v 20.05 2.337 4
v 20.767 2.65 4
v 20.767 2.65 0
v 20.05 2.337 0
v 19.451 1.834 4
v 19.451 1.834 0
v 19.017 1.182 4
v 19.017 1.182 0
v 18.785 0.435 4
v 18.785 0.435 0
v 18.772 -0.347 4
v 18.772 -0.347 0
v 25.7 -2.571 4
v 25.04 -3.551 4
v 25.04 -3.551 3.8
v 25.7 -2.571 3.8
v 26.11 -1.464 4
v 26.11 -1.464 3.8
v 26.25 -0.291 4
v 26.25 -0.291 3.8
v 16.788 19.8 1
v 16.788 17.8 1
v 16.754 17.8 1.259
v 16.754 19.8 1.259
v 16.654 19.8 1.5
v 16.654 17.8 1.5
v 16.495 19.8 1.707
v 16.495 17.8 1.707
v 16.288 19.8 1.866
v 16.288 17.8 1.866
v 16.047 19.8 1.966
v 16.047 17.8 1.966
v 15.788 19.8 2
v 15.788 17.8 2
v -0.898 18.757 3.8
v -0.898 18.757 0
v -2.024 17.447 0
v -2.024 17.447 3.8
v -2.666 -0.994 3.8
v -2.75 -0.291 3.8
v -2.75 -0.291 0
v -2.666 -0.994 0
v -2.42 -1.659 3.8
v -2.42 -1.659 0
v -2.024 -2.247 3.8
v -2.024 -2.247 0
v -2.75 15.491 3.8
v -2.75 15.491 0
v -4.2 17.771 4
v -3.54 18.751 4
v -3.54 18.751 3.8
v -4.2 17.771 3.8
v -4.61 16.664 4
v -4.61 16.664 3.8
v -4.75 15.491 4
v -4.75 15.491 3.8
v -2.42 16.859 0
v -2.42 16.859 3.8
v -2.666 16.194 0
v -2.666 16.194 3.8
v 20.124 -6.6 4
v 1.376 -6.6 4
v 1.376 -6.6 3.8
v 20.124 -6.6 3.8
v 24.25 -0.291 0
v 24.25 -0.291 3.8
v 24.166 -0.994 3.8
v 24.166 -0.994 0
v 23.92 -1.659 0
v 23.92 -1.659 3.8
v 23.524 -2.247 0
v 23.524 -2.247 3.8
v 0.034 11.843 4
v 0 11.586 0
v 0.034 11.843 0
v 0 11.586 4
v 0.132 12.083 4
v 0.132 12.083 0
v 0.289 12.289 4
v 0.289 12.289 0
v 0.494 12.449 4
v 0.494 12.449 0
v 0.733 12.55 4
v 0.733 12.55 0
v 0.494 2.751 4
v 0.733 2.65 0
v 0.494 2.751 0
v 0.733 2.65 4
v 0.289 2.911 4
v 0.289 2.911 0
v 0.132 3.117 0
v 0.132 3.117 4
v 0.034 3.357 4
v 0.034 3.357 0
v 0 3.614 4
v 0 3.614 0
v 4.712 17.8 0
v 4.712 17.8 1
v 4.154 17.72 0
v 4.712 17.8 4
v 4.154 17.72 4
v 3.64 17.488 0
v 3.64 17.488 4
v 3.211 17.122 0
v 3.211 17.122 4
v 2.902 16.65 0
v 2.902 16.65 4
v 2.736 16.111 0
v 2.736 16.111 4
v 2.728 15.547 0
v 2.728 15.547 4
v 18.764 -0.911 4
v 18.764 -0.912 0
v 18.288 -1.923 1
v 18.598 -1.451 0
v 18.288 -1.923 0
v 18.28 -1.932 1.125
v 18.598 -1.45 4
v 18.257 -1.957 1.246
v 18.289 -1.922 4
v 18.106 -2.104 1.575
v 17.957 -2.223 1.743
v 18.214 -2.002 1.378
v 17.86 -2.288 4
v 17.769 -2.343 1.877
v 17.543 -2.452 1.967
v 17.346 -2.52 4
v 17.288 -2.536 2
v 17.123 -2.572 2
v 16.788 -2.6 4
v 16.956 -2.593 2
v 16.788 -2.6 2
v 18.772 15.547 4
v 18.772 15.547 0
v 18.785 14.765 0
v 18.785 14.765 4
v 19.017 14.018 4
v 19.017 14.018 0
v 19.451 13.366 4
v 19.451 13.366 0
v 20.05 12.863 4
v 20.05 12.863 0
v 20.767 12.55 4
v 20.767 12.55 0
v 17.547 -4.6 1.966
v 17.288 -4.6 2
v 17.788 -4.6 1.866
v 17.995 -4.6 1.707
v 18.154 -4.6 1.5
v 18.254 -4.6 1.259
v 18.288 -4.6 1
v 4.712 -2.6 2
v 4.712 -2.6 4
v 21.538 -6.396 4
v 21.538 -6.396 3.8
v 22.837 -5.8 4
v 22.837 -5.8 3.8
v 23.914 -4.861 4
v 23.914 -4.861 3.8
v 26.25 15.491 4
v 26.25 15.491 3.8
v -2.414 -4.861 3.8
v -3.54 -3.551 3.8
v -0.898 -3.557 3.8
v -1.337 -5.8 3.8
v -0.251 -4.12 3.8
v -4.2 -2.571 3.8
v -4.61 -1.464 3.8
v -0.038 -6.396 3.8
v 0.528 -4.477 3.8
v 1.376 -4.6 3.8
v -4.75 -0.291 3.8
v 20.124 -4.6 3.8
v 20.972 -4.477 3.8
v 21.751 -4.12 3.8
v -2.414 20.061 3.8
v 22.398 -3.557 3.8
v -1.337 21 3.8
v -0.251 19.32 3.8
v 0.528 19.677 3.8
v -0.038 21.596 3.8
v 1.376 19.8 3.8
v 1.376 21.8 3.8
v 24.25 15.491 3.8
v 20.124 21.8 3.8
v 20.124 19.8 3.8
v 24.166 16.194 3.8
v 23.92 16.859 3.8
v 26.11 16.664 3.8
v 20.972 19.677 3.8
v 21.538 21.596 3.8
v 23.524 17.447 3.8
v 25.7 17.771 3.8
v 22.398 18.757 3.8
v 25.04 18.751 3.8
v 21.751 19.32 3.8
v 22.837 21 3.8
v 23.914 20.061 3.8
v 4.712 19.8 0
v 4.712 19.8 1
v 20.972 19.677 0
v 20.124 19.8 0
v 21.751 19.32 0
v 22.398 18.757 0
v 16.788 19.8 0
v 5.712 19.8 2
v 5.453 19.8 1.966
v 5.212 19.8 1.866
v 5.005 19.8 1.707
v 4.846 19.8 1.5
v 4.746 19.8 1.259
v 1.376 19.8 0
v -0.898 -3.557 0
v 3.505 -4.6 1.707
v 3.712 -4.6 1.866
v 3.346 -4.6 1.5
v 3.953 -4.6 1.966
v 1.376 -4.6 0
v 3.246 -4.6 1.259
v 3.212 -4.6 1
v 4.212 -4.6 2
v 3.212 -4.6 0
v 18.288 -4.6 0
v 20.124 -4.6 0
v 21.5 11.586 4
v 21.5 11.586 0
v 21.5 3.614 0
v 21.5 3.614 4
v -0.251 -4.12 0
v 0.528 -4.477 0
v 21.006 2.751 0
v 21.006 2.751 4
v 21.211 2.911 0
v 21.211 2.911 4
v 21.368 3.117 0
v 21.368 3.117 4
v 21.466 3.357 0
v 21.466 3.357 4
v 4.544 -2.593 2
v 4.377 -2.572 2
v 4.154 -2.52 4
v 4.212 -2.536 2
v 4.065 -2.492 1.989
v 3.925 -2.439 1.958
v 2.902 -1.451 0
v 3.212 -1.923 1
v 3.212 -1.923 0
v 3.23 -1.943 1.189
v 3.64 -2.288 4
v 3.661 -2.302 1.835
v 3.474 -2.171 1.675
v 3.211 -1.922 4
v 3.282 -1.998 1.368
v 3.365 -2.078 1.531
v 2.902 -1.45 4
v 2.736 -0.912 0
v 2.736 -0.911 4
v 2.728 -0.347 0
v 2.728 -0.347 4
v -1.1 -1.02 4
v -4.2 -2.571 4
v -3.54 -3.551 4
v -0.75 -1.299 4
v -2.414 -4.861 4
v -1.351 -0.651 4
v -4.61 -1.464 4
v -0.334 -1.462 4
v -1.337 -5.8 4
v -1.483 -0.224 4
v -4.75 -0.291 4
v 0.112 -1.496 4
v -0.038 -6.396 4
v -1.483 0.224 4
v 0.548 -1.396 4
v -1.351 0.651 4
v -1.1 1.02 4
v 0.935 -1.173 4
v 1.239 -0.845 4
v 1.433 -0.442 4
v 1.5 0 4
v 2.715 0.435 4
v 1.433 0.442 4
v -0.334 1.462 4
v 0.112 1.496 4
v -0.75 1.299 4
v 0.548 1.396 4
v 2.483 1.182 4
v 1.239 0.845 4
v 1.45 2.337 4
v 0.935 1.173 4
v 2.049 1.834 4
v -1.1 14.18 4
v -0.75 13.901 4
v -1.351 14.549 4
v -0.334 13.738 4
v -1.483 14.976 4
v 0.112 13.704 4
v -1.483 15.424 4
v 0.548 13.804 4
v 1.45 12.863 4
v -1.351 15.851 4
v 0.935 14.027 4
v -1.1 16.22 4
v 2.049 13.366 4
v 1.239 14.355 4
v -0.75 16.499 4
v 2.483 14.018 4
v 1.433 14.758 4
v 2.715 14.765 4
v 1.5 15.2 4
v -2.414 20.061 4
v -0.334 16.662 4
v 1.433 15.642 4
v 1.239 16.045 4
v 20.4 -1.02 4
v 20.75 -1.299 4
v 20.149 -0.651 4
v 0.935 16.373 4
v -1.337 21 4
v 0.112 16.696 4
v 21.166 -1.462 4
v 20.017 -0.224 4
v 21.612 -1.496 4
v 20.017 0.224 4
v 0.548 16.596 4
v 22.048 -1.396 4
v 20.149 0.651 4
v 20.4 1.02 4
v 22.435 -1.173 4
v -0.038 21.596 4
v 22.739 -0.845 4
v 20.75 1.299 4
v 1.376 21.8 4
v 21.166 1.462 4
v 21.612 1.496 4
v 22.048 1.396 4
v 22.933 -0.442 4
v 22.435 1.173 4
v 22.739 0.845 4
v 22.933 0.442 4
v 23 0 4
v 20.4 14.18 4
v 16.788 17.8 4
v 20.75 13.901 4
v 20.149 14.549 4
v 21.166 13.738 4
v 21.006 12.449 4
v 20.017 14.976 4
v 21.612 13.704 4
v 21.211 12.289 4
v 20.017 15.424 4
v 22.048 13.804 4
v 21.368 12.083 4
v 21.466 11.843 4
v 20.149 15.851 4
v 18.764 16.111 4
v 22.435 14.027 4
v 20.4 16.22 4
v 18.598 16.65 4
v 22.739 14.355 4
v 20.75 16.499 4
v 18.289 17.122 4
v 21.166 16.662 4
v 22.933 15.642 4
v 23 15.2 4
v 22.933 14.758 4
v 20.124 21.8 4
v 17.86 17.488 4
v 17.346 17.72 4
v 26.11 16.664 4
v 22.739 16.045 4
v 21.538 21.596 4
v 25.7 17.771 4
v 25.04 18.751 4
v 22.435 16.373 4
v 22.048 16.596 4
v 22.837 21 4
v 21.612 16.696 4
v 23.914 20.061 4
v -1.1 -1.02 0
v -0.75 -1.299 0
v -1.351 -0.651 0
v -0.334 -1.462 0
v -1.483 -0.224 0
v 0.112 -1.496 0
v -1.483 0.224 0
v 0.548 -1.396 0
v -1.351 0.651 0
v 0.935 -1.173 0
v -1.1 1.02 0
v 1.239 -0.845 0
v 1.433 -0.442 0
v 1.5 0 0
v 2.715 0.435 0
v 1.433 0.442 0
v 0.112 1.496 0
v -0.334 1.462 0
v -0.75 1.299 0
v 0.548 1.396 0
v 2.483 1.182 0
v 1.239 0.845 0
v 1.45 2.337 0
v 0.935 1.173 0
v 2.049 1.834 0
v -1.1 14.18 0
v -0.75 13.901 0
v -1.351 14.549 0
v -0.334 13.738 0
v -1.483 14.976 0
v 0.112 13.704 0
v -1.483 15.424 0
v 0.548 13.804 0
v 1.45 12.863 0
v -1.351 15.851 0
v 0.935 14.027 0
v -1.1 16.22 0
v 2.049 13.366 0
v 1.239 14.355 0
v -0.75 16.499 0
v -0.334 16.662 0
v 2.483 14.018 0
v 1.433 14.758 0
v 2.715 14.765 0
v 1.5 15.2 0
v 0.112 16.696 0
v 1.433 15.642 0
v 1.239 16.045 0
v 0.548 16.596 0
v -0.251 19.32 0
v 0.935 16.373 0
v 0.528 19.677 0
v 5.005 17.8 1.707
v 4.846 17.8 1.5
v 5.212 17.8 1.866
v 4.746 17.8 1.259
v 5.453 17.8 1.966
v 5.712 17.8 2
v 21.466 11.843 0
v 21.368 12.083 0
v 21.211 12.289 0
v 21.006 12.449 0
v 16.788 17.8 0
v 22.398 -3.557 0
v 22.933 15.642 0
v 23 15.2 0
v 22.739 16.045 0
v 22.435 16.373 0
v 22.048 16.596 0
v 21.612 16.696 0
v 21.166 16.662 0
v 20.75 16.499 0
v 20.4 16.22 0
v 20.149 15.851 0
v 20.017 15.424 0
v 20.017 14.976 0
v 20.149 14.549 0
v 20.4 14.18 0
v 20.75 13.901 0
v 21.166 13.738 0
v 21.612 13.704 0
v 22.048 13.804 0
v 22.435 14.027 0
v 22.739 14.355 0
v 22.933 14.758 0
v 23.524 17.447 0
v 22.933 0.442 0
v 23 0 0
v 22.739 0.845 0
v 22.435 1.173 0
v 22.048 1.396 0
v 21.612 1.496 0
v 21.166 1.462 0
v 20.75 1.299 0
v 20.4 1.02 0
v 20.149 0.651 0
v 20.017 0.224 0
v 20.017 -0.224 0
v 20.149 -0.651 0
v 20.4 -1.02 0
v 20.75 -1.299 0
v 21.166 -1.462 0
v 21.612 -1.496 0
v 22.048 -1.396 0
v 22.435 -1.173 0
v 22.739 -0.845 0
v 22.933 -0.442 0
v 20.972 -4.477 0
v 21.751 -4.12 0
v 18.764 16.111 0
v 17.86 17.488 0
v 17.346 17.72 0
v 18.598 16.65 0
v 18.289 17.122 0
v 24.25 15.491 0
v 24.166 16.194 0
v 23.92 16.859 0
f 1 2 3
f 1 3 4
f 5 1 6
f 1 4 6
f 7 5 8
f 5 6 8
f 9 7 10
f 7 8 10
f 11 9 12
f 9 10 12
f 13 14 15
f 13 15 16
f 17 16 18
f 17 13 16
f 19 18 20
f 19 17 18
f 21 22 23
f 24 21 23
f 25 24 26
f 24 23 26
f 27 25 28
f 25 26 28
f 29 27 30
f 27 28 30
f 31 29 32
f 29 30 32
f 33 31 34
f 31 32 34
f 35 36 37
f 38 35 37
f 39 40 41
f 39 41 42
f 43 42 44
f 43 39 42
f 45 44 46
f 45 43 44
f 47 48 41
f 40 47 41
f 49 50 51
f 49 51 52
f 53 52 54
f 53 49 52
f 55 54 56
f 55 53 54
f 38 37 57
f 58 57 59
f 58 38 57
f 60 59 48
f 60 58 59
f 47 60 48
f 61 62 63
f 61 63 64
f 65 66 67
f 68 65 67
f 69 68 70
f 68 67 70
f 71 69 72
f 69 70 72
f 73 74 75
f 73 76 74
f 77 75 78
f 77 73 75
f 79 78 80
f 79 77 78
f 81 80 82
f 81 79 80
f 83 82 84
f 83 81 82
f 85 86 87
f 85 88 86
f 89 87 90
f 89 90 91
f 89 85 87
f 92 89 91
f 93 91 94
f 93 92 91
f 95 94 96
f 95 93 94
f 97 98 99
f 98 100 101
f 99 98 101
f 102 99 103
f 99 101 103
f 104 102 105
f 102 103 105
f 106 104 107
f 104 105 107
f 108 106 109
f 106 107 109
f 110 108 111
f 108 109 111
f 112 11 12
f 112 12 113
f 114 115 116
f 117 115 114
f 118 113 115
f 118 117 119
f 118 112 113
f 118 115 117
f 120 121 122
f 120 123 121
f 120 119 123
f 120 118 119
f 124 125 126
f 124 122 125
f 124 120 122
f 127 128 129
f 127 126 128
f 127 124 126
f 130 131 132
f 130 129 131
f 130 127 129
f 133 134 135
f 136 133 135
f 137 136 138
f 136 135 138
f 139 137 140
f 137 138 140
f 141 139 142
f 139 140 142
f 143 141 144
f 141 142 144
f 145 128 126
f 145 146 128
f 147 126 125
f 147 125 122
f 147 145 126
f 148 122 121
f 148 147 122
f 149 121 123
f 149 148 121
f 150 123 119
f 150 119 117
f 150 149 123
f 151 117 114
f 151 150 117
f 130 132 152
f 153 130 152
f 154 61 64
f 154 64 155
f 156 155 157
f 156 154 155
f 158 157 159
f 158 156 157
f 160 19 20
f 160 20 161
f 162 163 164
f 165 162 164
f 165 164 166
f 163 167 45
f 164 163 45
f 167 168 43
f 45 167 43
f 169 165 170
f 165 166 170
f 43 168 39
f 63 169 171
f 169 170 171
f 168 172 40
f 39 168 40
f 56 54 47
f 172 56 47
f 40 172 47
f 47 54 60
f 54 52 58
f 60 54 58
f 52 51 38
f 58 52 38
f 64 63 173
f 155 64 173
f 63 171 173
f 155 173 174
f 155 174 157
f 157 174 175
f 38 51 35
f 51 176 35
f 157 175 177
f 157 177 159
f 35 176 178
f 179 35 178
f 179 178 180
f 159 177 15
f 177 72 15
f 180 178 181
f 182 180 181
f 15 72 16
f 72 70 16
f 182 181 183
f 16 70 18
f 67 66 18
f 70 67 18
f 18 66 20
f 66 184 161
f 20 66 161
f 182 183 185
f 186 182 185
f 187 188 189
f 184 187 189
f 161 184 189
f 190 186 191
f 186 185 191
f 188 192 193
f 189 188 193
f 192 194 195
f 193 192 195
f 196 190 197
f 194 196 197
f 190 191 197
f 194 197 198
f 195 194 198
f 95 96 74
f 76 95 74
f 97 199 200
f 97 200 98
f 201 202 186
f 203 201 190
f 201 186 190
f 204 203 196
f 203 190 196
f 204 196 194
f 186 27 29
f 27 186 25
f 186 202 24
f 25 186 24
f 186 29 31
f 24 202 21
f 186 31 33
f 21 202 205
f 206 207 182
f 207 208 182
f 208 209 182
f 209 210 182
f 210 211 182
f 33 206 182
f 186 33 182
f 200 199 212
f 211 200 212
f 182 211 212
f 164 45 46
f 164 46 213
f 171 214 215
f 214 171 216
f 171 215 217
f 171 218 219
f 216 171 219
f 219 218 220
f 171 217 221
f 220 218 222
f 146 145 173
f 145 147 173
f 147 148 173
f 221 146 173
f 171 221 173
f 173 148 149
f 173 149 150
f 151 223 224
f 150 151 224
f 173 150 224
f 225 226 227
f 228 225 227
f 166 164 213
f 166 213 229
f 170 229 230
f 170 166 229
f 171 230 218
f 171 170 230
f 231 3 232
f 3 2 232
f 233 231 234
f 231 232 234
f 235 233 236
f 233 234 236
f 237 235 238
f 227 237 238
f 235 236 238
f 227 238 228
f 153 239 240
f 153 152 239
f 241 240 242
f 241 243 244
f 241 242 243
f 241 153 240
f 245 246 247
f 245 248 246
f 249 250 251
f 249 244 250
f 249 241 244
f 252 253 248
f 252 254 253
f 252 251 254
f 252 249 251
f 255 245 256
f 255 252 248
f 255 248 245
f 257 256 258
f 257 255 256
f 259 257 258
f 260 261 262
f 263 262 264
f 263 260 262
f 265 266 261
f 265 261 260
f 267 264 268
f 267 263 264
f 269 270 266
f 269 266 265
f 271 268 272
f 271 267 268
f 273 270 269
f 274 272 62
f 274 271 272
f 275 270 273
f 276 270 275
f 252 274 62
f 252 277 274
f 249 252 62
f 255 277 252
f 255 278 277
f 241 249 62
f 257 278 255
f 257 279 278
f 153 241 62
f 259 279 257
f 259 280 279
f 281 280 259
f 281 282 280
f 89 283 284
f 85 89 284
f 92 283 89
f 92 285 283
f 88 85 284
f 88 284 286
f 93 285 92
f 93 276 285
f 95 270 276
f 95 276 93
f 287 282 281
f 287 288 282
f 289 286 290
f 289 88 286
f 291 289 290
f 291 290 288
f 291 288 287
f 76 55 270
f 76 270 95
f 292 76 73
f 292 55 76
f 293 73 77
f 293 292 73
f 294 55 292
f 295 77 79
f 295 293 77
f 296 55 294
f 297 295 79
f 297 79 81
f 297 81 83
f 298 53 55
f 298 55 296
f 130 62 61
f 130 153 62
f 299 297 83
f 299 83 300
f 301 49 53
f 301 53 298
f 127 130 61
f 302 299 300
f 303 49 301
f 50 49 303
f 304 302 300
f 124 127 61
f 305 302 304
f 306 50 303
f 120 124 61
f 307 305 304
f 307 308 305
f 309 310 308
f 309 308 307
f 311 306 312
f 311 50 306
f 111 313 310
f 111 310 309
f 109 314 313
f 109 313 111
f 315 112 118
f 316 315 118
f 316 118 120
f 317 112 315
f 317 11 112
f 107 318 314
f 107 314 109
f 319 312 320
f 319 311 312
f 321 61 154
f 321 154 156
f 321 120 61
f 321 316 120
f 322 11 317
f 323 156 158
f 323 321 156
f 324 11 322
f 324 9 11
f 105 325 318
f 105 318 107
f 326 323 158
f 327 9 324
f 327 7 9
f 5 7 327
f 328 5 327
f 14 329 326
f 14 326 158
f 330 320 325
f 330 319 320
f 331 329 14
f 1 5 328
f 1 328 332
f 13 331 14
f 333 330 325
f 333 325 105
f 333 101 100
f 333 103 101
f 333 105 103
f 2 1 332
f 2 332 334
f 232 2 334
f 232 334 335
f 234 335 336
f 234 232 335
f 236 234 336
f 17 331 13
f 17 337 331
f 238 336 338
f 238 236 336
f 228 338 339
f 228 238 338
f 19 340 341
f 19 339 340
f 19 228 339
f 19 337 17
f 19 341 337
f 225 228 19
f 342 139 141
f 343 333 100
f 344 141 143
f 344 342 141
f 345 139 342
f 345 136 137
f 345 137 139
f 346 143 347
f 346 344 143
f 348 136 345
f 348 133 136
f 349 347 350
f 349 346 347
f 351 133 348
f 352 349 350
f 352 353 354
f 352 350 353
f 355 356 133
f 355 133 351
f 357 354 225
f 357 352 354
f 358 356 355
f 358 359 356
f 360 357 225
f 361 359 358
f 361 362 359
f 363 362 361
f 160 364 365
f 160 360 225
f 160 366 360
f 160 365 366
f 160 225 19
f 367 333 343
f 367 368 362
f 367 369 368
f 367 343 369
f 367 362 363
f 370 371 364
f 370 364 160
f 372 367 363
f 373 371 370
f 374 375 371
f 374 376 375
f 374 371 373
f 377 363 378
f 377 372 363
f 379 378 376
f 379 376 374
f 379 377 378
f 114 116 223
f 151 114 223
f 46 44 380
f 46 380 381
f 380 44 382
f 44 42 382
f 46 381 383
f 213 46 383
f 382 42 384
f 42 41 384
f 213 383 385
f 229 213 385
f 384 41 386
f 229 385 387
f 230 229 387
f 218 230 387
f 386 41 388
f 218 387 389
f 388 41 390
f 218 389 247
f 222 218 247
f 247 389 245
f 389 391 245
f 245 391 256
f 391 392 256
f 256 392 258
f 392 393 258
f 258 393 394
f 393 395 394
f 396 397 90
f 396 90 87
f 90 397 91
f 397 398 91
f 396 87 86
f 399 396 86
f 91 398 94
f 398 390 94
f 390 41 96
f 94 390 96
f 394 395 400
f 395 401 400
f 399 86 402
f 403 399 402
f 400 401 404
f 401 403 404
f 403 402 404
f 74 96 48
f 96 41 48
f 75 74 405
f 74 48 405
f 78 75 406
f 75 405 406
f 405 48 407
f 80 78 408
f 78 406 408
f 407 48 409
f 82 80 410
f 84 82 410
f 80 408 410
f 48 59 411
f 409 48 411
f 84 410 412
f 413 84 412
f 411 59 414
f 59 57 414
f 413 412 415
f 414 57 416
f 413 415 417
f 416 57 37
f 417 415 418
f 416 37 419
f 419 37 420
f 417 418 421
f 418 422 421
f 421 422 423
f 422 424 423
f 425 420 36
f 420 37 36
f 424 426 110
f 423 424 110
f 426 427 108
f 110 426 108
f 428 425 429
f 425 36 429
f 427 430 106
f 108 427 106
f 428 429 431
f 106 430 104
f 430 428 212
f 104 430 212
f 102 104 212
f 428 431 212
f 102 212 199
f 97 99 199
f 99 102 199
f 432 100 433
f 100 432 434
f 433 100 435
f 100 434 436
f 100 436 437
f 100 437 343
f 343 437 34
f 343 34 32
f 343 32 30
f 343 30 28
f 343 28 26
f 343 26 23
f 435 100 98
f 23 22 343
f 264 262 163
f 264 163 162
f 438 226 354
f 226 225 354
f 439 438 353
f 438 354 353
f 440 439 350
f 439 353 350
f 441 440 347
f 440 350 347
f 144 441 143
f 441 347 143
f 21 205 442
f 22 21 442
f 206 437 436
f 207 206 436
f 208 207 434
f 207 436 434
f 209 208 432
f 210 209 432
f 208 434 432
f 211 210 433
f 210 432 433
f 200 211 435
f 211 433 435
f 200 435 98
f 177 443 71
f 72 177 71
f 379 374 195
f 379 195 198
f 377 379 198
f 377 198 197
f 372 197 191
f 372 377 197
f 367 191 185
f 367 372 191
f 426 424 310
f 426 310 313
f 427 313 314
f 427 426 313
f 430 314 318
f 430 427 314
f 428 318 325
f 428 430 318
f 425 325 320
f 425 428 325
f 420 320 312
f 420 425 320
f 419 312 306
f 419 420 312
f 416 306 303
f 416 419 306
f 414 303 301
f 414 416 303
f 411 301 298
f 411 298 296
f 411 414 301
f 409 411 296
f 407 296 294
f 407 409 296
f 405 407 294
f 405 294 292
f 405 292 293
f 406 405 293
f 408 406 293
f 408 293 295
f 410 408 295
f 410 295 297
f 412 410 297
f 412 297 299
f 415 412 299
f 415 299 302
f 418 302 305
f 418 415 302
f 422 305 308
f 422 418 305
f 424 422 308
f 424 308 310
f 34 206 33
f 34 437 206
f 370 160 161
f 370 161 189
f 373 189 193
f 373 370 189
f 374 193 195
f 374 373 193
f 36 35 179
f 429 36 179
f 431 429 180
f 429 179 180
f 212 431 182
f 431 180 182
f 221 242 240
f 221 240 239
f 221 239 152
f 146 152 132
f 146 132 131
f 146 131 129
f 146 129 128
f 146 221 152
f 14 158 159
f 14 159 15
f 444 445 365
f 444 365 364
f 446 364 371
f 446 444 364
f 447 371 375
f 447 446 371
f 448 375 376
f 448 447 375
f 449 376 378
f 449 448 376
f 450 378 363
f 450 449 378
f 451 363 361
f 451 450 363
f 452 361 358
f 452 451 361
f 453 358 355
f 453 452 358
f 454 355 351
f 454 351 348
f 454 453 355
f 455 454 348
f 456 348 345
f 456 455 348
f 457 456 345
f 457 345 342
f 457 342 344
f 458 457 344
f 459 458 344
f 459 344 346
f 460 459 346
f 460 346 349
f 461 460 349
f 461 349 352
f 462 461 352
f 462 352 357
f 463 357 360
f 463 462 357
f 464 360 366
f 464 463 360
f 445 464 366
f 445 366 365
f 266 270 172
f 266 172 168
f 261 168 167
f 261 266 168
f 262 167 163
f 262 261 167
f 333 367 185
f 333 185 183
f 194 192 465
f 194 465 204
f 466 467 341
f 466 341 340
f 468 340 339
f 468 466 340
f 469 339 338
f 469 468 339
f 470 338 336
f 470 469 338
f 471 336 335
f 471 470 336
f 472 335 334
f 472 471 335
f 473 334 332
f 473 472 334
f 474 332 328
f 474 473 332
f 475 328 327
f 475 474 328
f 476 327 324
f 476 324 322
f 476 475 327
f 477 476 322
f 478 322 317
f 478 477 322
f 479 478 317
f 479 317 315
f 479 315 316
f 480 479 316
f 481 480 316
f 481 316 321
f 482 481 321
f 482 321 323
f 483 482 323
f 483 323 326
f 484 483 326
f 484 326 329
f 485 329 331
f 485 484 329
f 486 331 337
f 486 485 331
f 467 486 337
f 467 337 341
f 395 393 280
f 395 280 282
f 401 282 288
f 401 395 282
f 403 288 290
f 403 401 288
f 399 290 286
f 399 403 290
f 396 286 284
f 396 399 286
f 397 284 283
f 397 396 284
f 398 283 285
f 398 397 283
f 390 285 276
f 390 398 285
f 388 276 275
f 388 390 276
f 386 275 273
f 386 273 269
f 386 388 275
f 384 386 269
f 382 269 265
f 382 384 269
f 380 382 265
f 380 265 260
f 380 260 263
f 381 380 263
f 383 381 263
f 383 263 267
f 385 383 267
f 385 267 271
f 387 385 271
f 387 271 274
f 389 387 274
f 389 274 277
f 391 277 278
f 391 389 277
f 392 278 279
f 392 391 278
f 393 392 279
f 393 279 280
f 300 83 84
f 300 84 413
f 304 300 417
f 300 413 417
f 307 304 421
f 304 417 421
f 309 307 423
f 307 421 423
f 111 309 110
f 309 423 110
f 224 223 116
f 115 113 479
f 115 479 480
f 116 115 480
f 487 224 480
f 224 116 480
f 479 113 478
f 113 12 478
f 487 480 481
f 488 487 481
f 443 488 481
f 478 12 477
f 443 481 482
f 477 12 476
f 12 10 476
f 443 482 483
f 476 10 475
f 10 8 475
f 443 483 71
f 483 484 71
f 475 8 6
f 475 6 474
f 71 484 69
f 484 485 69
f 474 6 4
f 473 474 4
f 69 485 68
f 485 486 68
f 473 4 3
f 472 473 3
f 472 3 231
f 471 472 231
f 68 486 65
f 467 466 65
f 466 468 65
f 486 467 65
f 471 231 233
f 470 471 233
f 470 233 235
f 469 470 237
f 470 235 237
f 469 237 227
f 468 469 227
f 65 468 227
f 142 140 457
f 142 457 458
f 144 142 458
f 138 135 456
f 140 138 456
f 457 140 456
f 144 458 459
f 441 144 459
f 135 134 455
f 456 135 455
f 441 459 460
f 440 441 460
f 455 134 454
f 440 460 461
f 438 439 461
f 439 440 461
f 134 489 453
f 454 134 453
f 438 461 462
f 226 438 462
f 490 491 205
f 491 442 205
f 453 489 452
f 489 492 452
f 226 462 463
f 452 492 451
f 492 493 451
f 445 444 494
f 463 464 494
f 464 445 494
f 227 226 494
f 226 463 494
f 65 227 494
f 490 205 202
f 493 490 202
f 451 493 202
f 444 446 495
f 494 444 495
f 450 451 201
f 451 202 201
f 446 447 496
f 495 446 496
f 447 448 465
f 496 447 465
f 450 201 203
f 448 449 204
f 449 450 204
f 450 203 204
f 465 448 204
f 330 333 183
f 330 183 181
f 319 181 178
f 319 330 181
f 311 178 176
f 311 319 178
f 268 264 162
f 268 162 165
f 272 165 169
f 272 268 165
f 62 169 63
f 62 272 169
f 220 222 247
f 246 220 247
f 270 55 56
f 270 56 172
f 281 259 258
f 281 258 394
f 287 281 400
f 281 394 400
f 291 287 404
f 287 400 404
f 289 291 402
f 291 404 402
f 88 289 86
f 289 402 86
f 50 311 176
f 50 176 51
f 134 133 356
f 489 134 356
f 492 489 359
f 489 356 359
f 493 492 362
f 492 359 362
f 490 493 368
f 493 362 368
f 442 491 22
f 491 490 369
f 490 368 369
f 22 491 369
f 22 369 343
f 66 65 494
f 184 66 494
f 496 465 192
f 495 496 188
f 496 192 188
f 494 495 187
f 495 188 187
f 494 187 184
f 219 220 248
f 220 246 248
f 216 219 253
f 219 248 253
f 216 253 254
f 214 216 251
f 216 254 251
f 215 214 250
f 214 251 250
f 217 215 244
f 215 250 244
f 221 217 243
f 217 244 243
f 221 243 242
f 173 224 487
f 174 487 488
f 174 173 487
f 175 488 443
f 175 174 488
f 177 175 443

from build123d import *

# Parameters (mm, degrees)
F0_R     = 1.5
F1_DEPTH = 4
F2_R     = 2
F3_R     = 1
F4_R     = 3
F5_W     = 12.076094228
F5_H     = 2
F6_DEPTH = 2
F8_DEPTH = 0.2
F9_R     = 1


with BuildPart() as f1:
    # F0 (on Top) → F1 (new body)
    with BuildSketch(Plane.XY):
        Polygon((0, 19.8), (-2.75, 16.6034741081), (-2.75, -1.4034741081), (0, -4.6), (21.5, -4.6), (24.25, -1.4034741081), (24.25, 16.6034741081), (21.5, 19.8), align=None)
        Circle(F0_R, mode=Mode.SUBTRACT)
        with Locations((21.5, 0)):
            Circle(F0_R, mode=Mode.SUBTRACT)
        with Locations((0, 15.2)):
            Circle(F0_R, mode=Mode.SUBTRACT)
        with BuildLine():
            Line((20.6041763566, -2.6), (0.8958236434, -2.6))
            ThreePointArc((0.8958236434, -2.6), (2.712240771, 0.4541475531), (0, 2.75))
            Line((0, 2.75), (0, 12.45))
            ThreePointArc((0, 12.45), (2.712240771, 14.7458524469), (0.8958236434, 17.8))
            Line((0.8958236434, 17.8), (20.6041763566, 17.8))
            ThreePointArc((20.6041763566, 17.8), (18.787759229, 14.7458524469), (21.5, 12.45))
            Line((21.5, 12.45), (21.5, 2.75))
            ThreePointArc((21.5, 2.75), (18.787759229, 0.4541475531), (20.6041763566, -2.6))
        make_face(mode=Mode.SUBTRACT)
        with Locations((21.5, 15.2)):
            Circle(F0_R, mode=Mode.SUBTRACT)
    extrude(amount=F1_DEPTH)

    # F2
    f2_edges = [f1.edges().sort_by_distance(p)[0] for p in [
        (0.895824, 17.8, 2),
        (20.604176, 17.8, 2),
        (0.895824, -2.6, 2),
        (20.604176, -2.6, 2),
    ]]
    fillet(f2_edges, radius=F2_R)

    # F3
    f3_edges = [f1.edges().sort_by_distance(p)[0] for p in [
        (0, 12.45, 2),
        (0, 2.75, 2),
        (21.5, 12.45, 2),
        (21.5, 2.75, 2),
    ]]
    fillet(f3_edges, radius=F3_R)

    # F4
    f4_edges = [f1.edges().sort_by_distance(p)[0] for p in [
        (0, -4.6, 2),
        (21.5, -4.6, 2),
        (24.25, -1.403474, 2),
        (24.25, 16.603474, 2),
        (21.5, 19.8, 2),
        (0, 19.8, 2),
        (-2.75, 16.603474, 2),
        (-2.75, -1.403474, 2),
    ]]
    fillet(f4_edges, radius=F4_R)

    # F5 (on face) → F6 (cut)
    with BuildSketch(Plane(origin=(0, 0, 0), x_dir=(1, 0, 0), z_dir=(0, 0, -1))):
        with Locations((10.75, -18.8)):
            Rectangle(F5_W, F5_H)
        with BuildLine():
            Line((3.211952886, 4.6), (3.211952886, 1.9228756555))
            ThreePointArc((3.211952886, 1.9228756555), (3.8890772305, 2.4228756555), (4.711952886, 2.6))
            Line((4.711952886, 2.6), (16.788047114, 2.6))
            ThreePointArc((16.788047114, 2.6), (17.6109227695, 2.4228756555), (18.288047114, 1.9228756555))
            Line((18.288047114, 1.9228756555), (18.288047114, 4.6))
            Line((18.288047114, 4.6), (3.211952886, 4.6))
        make_face()
    extrude(amount=-F6_DEPTH, mode=Mode.SUBTRACT)

    # F7 (on face) → F8 (join)
    with BuildSketch(Plane.XY.offset(4)):
        with BuildLine():
            ThreePointArc((-3.5403469074, 18.7514628281), (-4.4378424961, 17.2295966359), (-4.75, 15.4905932629))
            Line((-4.75, 15.4905932629), (-4.75, -0.2905932629))
            ThreePointArc((-4.75, -0.2905932629), (-4.4378424961, -2.0295966359), (-3.5403469074, -3.5514628281))
            Line((-3.5403469074, -3.5514628281), (-2.4138525042, -4.8608695652))
            ThreePointArc((-2.4138525042, -4.8608695652), (-0.7086497373, -6.1444662957), (1.3764944032, -6.6))
            Line((1.3764944032, -6.6), (20.1235055968, -6.6))
            ThreePointArc((20.1235055968, -6.6), (22.2086497373, -6.1444662957), (23.9138525042, -4.8608695652))
            Line((23.9138525042, -4.8608695652), (25.0403469074, -3.5514628281))
            ThreePointArc((25.0403469074, -3.5514628281), (25.9378424961, -2.0295966359), (26.25, -0.2905932629))
            Line((26.25, -0.2905932629), (26.25, 15.4905932629))
            ThreePointArc((26.25, 15.4905932629), (25.9378424961, 17.2295966359), (25.0403469074, 18.7514628281))
            Line((25.0403469074, 18.7514628281), (23.9138525042, 20.0608695652))
            ThreePointArc((23.9138525042, 20.0608695652), (22.2086497373, 21.3444662957), (20.1235055968, 21.8))
            Line((20.1235055968, 21.8), (1.3764944032, 21.8))
            ThreePointArc((1.3764944032, 21.8), (-0.7086497373, 21.3444662957), (-2.4138525042, 20.0608695652))
            Line((-2.4138525042, 20.0608695652), (-3.5403469074, 18.7514628281))
        make_face()
        with BuildLine():
            Line((-2.75, -0.2905932629), (-2.75, 15.4905932629))
            ThreePointArc((-2.75, 15.4905932629), (-2.5627054977, 16.5339952867), (-2.0242081445, 17.447115002))
            Line((-2.0242081445, 17.447115002), (-0.8977137412, 18.7565217391))
            ThreePointArc((-0.8977137412, 18.7565217391), (0.1254079189, 19.5266797774), (1.3764944032, 19.8))
            Line((1.3764944032, 19.8), (20.1235055968, 19.8))
            ThreePointArc((20.1235055968, 19.8), (21.3745920811, 19.5266797774), (22.3977137412, 18.7565217391))
            Line((22.3977137412, 18.7565217391), (23.5242081445, 17.447115002))
            ThreePointArc((23.5242081445, 17.447115002), (24.0627054977, 16.5339952867), (24.25, 15.4905932629))
            Line((24.25, 15.4905932629), (24.25, -0.2905932629))
            ThreePointArc((24.25, -0.2905932629), (24.0627054977, -1.3339952867), (23.5242081445, -2.247115002))
            Line((23.5242081445, -2.247115002), (22.3977137412, -3.5565217391))
            ThreePointArc((22.3977137412, -3.5565217391), (21.3745920811, -4.3266797774), (20.1235055968, -4.6))
            Line((20.1235055968, -4.6), (1.3764944032, -4.6))
            ThreePointArc((1.3764944032, -4.6), (0.1254079189, -4.3266797774), (-0.8977137412, -3.5565217391))
            Line((-0.8977137412, -3.5565217391), (-2.0242081445, -2.247115002))
            ThreePointArc((-2.0242081445, -2.247115002), (-2.5627054977, -1.3339952867), (-2.75, -0.2905932629))
        make_face(mode=Mode.SUBTRACT)
    extrude(amount=-F8_DEPTH)

    # F9
    f9_edges = [f1.edges().sort_by_distance(p)[0] for p in [
        (3.211953, -3.261438, 2),
        (18.288047, -3.261438, 2),
        (16.788047, 18.8, 2),
        (4.711953, 18.8, 2),
    ]]
    fillet(f9_edges, radius=F9_R)


solid = f1.part
